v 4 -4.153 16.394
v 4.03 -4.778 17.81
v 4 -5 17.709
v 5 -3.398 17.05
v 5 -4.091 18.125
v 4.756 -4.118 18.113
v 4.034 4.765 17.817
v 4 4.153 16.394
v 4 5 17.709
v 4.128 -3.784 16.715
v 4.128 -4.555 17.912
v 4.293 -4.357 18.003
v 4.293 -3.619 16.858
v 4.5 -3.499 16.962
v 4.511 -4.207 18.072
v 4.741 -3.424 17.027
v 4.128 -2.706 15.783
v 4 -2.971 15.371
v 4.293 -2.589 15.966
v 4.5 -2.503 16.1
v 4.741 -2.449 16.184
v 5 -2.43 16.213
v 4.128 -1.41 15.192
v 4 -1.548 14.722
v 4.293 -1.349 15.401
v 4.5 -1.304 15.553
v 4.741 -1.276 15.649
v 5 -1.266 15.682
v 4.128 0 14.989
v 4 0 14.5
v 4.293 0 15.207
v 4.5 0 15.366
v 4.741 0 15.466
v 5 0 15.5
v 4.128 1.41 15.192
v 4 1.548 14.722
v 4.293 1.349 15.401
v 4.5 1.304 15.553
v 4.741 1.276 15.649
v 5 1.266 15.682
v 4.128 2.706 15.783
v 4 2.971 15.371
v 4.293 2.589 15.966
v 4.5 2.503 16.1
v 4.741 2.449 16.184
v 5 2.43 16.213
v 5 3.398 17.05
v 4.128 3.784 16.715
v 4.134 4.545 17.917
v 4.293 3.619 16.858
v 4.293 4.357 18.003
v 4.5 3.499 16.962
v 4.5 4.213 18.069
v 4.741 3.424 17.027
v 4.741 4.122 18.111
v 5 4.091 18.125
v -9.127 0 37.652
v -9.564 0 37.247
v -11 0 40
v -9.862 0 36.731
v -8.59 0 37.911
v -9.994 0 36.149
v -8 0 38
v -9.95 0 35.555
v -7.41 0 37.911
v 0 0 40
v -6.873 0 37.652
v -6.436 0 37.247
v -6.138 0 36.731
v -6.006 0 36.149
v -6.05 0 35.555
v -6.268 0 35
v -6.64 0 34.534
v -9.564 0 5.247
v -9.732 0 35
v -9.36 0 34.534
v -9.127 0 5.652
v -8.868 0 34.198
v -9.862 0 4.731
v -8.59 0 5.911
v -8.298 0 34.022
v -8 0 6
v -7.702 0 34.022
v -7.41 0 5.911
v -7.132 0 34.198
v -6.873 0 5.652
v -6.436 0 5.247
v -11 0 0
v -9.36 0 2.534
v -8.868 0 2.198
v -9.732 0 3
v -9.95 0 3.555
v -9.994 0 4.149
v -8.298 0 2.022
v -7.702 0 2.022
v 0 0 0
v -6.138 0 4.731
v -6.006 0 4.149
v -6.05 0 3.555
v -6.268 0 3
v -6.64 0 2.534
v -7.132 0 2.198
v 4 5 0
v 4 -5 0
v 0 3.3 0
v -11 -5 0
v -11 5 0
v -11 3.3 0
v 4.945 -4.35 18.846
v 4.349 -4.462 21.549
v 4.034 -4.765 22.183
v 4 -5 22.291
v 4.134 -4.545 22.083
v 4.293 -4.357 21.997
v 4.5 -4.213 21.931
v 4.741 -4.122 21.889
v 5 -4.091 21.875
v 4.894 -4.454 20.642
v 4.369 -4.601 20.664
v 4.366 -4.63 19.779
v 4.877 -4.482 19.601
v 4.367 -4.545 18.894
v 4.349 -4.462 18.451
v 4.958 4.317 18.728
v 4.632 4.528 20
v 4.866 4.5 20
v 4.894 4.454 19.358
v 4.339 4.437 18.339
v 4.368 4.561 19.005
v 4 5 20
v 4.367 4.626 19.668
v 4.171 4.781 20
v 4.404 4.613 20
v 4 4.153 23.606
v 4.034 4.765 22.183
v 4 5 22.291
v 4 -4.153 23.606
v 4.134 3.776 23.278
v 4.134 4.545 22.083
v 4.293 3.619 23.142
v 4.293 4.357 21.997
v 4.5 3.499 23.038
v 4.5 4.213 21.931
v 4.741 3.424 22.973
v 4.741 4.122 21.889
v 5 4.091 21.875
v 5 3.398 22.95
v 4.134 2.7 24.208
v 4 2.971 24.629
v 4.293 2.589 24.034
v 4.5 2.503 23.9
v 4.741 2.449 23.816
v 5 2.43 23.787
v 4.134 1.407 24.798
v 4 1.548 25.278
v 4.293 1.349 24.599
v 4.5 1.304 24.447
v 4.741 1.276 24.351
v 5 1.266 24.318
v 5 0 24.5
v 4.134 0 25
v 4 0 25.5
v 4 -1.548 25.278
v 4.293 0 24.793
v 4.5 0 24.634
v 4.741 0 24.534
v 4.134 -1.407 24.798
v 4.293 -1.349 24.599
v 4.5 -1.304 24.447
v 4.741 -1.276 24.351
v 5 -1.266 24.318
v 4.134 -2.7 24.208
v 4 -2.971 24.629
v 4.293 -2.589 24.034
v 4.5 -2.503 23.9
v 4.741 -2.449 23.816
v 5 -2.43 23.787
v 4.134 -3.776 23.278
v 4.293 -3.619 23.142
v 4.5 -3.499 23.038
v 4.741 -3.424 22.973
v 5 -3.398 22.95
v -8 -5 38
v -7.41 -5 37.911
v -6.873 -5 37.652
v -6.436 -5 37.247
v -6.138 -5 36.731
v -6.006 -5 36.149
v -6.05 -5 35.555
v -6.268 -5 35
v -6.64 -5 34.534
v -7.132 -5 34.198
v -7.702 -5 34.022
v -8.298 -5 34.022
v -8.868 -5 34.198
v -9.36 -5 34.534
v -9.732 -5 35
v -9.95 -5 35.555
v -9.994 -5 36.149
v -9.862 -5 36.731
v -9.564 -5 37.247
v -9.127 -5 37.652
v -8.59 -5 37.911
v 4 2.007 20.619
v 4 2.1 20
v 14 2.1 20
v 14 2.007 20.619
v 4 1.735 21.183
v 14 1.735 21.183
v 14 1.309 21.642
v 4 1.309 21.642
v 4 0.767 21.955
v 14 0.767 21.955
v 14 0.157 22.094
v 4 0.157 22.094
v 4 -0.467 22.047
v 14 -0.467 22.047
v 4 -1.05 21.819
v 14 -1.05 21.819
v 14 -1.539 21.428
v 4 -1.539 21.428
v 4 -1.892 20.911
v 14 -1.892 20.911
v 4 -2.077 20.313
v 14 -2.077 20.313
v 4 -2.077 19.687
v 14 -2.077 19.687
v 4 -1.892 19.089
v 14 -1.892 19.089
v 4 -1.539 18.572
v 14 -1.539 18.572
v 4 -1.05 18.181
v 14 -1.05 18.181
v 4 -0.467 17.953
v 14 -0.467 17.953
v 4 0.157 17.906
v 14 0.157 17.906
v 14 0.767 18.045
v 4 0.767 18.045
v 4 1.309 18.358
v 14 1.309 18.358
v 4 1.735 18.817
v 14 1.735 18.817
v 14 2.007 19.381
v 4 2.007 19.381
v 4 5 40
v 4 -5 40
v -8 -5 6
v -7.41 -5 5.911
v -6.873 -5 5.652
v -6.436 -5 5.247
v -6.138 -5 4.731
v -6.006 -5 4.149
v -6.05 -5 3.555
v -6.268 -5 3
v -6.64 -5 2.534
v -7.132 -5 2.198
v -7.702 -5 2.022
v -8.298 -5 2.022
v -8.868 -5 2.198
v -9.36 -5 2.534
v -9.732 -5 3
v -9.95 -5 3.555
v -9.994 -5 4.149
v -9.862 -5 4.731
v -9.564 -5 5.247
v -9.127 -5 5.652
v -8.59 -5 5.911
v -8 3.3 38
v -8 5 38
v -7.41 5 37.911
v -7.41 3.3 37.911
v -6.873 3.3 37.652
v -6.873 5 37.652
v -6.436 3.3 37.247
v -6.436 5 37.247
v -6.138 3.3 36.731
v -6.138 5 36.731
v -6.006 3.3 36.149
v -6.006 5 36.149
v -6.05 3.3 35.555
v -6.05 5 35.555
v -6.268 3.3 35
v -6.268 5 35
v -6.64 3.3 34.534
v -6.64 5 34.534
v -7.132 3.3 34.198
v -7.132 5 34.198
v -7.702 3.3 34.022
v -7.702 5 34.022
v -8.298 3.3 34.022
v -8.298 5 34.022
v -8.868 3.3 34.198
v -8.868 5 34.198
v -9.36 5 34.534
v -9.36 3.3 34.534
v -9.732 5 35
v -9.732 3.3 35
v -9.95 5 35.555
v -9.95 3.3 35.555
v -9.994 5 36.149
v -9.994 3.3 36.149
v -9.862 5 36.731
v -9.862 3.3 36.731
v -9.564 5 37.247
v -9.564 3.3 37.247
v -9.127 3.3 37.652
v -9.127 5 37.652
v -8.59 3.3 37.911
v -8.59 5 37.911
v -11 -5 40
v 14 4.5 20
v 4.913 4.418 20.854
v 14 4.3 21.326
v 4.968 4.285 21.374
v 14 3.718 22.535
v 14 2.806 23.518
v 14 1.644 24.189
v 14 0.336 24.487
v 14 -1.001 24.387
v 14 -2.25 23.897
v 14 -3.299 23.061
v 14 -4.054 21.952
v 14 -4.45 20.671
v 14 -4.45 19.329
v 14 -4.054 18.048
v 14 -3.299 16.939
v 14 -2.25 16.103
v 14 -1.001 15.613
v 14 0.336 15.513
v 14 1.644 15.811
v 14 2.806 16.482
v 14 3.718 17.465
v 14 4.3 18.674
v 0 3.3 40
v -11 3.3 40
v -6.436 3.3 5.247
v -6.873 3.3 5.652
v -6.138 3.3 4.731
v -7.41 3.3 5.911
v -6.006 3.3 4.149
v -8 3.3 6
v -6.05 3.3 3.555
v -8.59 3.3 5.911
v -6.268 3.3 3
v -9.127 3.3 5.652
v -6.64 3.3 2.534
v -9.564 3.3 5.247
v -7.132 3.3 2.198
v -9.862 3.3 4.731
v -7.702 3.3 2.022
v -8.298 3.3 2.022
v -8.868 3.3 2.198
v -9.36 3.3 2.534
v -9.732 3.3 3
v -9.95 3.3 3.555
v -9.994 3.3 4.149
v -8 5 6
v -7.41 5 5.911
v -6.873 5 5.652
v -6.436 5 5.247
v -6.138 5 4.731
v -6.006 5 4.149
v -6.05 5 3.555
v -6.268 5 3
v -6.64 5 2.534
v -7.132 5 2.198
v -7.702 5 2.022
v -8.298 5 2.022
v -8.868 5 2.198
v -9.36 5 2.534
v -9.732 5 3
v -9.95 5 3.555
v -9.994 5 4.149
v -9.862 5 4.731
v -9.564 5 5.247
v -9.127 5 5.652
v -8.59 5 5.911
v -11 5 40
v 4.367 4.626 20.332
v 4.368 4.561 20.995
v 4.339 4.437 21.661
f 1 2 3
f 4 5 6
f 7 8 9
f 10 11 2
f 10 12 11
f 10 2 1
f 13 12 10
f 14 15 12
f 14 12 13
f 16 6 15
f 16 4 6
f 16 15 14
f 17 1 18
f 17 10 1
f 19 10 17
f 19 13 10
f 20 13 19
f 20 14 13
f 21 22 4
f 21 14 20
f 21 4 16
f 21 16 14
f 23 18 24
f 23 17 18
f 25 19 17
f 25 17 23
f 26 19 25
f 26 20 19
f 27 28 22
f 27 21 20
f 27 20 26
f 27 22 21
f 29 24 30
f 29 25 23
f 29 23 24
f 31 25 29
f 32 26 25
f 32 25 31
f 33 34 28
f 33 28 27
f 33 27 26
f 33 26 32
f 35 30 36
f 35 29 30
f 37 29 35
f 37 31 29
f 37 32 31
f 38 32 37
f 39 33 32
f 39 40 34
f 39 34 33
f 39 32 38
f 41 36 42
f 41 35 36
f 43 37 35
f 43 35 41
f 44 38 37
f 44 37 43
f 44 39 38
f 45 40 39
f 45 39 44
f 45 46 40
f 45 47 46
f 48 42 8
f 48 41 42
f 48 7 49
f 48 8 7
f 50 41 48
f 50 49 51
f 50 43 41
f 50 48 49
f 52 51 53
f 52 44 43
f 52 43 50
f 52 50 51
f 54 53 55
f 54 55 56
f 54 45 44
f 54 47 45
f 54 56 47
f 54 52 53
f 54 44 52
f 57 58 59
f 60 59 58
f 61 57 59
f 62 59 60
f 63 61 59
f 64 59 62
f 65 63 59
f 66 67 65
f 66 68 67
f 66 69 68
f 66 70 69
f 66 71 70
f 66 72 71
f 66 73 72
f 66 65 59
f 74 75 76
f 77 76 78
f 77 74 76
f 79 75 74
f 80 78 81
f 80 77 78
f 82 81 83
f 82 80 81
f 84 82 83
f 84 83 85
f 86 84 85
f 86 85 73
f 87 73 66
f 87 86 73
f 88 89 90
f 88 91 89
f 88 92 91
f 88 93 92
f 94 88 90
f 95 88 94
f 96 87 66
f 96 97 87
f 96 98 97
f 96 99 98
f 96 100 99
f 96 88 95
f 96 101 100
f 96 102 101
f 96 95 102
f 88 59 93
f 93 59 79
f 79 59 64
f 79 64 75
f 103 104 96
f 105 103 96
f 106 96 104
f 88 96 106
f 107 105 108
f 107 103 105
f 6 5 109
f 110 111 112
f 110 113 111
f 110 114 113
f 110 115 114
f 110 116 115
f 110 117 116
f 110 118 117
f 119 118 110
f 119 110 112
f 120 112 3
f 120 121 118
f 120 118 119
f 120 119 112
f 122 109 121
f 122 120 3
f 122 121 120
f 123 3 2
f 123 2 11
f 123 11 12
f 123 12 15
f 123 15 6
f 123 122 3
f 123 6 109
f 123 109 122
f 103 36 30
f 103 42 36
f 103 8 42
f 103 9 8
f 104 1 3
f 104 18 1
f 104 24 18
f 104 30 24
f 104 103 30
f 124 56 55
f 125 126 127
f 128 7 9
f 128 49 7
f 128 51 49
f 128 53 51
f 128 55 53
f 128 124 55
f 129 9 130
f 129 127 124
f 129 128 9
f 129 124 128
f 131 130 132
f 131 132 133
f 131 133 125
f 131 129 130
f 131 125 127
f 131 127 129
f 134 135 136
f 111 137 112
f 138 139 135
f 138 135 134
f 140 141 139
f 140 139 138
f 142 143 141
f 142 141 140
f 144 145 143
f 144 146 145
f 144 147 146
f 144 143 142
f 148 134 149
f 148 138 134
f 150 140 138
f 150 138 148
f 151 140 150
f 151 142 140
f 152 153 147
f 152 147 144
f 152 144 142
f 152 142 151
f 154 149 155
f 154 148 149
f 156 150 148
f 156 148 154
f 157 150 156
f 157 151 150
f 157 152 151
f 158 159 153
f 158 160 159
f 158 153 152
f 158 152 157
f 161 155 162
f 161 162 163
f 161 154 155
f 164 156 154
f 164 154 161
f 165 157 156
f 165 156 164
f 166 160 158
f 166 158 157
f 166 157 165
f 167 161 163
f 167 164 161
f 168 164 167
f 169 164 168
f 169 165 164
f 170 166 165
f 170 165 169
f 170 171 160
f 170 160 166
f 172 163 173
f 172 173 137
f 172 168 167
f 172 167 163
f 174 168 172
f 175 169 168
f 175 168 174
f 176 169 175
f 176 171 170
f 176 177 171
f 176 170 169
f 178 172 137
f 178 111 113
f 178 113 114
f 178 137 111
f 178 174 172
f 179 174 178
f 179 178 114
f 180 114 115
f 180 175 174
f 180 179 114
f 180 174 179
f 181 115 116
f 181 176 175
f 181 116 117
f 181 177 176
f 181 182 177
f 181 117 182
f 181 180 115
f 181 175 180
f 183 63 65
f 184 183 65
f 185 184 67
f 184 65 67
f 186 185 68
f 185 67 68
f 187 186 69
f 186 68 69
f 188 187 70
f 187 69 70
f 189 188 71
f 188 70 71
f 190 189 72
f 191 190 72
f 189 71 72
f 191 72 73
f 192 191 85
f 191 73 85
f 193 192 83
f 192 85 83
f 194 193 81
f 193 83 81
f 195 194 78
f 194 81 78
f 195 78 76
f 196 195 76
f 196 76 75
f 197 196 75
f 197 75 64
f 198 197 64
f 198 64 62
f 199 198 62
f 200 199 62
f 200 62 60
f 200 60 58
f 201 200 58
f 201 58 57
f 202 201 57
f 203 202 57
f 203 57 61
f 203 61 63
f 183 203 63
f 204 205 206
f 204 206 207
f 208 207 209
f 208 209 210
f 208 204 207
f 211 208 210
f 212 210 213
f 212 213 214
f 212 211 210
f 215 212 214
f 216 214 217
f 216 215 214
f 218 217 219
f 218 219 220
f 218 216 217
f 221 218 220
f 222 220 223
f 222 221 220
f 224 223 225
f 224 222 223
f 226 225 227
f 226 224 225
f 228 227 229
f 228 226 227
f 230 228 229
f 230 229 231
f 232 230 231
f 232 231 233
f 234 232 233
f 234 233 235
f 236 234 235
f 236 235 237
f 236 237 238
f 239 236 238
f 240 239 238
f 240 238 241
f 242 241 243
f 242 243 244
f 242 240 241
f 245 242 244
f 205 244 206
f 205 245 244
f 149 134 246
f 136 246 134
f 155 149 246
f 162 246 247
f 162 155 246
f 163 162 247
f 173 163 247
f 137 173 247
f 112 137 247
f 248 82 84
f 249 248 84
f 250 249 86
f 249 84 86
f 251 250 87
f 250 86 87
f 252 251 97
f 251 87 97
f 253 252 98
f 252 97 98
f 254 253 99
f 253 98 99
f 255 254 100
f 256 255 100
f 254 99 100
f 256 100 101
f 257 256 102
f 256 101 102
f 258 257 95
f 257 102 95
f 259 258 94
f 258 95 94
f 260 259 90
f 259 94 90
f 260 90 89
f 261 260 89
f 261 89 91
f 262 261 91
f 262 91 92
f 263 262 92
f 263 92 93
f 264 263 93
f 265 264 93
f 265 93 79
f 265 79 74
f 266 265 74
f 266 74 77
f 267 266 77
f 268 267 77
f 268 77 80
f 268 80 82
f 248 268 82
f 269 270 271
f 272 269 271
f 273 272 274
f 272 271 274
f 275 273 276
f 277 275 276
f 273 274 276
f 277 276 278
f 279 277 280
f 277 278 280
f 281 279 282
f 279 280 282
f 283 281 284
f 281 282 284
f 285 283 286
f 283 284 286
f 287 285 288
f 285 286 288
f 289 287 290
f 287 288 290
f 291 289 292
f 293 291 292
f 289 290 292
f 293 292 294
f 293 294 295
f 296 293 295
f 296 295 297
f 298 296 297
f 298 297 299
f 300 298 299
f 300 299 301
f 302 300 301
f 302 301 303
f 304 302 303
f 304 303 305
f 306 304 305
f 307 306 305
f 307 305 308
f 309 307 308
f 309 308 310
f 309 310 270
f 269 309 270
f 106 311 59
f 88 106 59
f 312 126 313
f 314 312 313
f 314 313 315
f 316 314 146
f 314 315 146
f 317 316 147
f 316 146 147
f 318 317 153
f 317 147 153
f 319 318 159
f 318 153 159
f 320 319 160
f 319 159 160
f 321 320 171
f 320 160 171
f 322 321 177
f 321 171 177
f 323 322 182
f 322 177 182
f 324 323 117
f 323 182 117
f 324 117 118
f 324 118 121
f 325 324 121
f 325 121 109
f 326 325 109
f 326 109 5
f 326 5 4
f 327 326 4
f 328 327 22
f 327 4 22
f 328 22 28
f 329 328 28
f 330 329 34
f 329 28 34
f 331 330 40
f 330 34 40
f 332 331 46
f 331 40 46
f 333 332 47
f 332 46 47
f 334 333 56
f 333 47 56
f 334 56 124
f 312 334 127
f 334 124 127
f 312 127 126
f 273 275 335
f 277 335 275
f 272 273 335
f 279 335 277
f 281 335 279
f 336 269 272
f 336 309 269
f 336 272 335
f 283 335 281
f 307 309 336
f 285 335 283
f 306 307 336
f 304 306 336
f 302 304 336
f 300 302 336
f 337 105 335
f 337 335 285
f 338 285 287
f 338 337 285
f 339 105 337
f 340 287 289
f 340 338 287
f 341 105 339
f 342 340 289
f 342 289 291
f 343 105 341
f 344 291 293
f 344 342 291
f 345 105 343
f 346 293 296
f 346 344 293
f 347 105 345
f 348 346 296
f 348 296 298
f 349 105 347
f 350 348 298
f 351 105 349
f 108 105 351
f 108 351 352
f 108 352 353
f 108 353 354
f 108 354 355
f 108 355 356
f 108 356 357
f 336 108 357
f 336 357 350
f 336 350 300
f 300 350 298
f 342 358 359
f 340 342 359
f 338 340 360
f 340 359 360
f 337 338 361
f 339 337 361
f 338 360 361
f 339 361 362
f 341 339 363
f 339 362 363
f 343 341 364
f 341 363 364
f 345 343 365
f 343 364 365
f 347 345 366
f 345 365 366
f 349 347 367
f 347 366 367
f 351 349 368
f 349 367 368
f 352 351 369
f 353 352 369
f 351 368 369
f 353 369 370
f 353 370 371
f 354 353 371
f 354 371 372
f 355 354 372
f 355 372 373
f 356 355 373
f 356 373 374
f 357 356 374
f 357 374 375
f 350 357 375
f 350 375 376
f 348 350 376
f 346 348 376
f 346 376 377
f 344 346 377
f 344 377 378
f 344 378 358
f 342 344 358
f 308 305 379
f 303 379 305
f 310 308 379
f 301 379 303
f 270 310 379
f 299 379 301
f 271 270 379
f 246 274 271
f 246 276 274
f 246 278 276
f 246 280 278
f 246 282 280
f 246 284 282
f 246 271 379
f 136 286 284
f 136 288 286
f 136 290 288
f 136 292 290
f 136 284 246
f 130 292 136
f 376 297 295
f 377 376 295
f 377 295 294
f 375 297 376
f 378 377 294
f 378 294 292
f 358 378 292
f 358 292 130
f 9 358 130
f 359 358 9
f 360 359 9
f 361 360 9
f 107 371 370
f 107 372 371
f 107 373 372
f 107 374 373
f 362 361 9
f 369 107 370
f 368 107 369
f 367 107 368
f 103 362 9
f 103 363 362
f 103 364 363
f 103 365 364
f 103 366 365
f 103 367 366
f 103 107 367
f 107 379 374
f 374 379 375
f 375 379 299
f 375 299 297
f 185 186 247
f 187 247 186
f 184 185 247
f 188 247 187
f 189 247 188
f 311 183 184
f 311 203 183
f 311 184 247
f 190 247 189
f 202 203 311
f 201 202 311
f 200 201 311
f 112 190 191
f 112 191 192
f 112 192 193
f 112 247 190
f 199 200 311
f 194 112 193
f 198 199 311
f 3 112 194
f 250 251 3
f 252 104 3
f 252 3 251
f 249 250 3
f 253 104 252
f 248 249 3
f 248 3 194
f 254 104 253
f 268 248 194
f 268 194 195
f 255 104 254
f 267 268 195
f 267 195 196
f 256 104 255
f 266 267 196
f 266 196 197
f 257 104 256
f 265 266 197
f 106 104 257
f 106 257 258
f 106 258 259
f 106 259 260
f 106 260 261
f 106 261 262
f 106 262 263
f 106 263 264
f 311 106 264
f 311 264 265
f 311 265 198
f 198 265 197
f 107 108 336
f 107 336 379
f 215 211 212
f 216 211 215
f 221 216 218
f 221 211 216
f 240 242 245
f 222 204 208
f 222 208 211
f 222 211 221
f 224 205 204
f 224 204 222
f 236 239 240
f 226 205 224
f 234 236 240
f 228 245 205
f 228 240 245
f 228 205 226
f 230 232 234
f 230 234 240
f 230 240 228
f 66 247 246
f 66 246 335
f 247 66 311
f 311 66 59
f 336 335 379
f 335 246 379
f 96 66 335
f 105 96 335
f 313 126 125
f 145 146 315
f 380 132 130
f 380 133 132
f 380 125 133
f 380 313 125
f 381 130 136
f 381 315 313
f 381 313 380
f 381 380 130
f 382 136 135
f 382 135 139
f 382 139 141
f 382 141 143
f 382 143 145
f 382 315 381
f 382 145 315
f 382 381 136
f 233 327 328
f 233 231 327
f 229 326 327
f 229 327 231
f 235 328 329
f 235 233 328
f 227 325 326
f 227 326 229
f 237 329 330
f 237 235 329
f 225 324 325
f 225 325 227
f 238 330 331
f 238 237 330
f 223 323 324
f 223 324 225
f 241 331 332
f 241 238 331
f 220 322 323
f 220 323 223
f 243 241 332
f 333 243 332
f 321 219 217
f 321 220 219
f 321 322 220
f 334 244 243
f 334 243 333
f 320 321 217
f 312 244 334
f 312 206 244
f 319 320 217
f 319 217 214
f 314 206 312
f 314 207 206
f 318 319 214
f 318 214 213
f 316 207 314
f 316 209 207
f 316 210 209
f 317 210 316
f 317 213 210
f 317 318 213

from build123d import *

# Parameters (mm, degrees)
BOSS_EXTRUDE1_DEPTH = 40
SKETCH4_R           = 4.5
SKETCH4_R_2         = 2.1
BOSS_EXTRUDE4_DEPTH = 10
FILLET2_R           = 1
SKETCH5_R           = 2
CUT_EXTRUDE1_DEPTH  = 44.543082261


with BuildPart() as part:
    # Sketch1 → Boss-Extrude1 (new body)
    with BuildSketch(Plane.XY):
        Polygon((-11, 3.3), (-11, 5), (4, 5), (4, -5), (-11, -5), (-11, 0), (0, 0), (0, 3.3), align=None)
    extrude(amount=BOSS_EXTRUDE1_DEPTH)

    # Sketch4 → Boss-Extrude4 (add)
    with BuildSketch(Plane(origin=(4, 0, 0), x_dir=(0, 0, -1), z_dir=(1, 0, 0))):
        with Locations(Location((-20, 0, 0), (0, 0, 90))):
            Circle(SKETCH4_R)
        with Locations(Location((-20, 0, 0), (0, 0, 90))):
            Circle(SKETCH4_R_2, mode=Mode.SUBTRACT)
    extrude(amount=BOSS_EXTRUDE4_DEPTH)

    # Fillet2
    fillet2_edges = [part.edges().sort_by_distance(p)[0] for p in [
        (4, -4.5, 20),
    ]]
    fillet(fillet2_edges, radius=FILLET2_R)

    # Sketch5 → Cut-Extrude1 (cut, through all)
    with BuildSketch(Plane(origin=(0, 5, 0), x_dir=(1, 0, 0), z_dir=(0, 1, 0))):
        with Locations(Location((-8, -36, 0), (0, 0, 270))):
            Circle(SKETCH5_R)
        with Locations(Location((-8, -4, 0), (0, 0, 270))):
            Circle(SKETCH5_R)
    extrude(amount=-CUT_EXTRUDE1_DEPTH, mode=Mode.SUBTRACT)


solid = part.part
